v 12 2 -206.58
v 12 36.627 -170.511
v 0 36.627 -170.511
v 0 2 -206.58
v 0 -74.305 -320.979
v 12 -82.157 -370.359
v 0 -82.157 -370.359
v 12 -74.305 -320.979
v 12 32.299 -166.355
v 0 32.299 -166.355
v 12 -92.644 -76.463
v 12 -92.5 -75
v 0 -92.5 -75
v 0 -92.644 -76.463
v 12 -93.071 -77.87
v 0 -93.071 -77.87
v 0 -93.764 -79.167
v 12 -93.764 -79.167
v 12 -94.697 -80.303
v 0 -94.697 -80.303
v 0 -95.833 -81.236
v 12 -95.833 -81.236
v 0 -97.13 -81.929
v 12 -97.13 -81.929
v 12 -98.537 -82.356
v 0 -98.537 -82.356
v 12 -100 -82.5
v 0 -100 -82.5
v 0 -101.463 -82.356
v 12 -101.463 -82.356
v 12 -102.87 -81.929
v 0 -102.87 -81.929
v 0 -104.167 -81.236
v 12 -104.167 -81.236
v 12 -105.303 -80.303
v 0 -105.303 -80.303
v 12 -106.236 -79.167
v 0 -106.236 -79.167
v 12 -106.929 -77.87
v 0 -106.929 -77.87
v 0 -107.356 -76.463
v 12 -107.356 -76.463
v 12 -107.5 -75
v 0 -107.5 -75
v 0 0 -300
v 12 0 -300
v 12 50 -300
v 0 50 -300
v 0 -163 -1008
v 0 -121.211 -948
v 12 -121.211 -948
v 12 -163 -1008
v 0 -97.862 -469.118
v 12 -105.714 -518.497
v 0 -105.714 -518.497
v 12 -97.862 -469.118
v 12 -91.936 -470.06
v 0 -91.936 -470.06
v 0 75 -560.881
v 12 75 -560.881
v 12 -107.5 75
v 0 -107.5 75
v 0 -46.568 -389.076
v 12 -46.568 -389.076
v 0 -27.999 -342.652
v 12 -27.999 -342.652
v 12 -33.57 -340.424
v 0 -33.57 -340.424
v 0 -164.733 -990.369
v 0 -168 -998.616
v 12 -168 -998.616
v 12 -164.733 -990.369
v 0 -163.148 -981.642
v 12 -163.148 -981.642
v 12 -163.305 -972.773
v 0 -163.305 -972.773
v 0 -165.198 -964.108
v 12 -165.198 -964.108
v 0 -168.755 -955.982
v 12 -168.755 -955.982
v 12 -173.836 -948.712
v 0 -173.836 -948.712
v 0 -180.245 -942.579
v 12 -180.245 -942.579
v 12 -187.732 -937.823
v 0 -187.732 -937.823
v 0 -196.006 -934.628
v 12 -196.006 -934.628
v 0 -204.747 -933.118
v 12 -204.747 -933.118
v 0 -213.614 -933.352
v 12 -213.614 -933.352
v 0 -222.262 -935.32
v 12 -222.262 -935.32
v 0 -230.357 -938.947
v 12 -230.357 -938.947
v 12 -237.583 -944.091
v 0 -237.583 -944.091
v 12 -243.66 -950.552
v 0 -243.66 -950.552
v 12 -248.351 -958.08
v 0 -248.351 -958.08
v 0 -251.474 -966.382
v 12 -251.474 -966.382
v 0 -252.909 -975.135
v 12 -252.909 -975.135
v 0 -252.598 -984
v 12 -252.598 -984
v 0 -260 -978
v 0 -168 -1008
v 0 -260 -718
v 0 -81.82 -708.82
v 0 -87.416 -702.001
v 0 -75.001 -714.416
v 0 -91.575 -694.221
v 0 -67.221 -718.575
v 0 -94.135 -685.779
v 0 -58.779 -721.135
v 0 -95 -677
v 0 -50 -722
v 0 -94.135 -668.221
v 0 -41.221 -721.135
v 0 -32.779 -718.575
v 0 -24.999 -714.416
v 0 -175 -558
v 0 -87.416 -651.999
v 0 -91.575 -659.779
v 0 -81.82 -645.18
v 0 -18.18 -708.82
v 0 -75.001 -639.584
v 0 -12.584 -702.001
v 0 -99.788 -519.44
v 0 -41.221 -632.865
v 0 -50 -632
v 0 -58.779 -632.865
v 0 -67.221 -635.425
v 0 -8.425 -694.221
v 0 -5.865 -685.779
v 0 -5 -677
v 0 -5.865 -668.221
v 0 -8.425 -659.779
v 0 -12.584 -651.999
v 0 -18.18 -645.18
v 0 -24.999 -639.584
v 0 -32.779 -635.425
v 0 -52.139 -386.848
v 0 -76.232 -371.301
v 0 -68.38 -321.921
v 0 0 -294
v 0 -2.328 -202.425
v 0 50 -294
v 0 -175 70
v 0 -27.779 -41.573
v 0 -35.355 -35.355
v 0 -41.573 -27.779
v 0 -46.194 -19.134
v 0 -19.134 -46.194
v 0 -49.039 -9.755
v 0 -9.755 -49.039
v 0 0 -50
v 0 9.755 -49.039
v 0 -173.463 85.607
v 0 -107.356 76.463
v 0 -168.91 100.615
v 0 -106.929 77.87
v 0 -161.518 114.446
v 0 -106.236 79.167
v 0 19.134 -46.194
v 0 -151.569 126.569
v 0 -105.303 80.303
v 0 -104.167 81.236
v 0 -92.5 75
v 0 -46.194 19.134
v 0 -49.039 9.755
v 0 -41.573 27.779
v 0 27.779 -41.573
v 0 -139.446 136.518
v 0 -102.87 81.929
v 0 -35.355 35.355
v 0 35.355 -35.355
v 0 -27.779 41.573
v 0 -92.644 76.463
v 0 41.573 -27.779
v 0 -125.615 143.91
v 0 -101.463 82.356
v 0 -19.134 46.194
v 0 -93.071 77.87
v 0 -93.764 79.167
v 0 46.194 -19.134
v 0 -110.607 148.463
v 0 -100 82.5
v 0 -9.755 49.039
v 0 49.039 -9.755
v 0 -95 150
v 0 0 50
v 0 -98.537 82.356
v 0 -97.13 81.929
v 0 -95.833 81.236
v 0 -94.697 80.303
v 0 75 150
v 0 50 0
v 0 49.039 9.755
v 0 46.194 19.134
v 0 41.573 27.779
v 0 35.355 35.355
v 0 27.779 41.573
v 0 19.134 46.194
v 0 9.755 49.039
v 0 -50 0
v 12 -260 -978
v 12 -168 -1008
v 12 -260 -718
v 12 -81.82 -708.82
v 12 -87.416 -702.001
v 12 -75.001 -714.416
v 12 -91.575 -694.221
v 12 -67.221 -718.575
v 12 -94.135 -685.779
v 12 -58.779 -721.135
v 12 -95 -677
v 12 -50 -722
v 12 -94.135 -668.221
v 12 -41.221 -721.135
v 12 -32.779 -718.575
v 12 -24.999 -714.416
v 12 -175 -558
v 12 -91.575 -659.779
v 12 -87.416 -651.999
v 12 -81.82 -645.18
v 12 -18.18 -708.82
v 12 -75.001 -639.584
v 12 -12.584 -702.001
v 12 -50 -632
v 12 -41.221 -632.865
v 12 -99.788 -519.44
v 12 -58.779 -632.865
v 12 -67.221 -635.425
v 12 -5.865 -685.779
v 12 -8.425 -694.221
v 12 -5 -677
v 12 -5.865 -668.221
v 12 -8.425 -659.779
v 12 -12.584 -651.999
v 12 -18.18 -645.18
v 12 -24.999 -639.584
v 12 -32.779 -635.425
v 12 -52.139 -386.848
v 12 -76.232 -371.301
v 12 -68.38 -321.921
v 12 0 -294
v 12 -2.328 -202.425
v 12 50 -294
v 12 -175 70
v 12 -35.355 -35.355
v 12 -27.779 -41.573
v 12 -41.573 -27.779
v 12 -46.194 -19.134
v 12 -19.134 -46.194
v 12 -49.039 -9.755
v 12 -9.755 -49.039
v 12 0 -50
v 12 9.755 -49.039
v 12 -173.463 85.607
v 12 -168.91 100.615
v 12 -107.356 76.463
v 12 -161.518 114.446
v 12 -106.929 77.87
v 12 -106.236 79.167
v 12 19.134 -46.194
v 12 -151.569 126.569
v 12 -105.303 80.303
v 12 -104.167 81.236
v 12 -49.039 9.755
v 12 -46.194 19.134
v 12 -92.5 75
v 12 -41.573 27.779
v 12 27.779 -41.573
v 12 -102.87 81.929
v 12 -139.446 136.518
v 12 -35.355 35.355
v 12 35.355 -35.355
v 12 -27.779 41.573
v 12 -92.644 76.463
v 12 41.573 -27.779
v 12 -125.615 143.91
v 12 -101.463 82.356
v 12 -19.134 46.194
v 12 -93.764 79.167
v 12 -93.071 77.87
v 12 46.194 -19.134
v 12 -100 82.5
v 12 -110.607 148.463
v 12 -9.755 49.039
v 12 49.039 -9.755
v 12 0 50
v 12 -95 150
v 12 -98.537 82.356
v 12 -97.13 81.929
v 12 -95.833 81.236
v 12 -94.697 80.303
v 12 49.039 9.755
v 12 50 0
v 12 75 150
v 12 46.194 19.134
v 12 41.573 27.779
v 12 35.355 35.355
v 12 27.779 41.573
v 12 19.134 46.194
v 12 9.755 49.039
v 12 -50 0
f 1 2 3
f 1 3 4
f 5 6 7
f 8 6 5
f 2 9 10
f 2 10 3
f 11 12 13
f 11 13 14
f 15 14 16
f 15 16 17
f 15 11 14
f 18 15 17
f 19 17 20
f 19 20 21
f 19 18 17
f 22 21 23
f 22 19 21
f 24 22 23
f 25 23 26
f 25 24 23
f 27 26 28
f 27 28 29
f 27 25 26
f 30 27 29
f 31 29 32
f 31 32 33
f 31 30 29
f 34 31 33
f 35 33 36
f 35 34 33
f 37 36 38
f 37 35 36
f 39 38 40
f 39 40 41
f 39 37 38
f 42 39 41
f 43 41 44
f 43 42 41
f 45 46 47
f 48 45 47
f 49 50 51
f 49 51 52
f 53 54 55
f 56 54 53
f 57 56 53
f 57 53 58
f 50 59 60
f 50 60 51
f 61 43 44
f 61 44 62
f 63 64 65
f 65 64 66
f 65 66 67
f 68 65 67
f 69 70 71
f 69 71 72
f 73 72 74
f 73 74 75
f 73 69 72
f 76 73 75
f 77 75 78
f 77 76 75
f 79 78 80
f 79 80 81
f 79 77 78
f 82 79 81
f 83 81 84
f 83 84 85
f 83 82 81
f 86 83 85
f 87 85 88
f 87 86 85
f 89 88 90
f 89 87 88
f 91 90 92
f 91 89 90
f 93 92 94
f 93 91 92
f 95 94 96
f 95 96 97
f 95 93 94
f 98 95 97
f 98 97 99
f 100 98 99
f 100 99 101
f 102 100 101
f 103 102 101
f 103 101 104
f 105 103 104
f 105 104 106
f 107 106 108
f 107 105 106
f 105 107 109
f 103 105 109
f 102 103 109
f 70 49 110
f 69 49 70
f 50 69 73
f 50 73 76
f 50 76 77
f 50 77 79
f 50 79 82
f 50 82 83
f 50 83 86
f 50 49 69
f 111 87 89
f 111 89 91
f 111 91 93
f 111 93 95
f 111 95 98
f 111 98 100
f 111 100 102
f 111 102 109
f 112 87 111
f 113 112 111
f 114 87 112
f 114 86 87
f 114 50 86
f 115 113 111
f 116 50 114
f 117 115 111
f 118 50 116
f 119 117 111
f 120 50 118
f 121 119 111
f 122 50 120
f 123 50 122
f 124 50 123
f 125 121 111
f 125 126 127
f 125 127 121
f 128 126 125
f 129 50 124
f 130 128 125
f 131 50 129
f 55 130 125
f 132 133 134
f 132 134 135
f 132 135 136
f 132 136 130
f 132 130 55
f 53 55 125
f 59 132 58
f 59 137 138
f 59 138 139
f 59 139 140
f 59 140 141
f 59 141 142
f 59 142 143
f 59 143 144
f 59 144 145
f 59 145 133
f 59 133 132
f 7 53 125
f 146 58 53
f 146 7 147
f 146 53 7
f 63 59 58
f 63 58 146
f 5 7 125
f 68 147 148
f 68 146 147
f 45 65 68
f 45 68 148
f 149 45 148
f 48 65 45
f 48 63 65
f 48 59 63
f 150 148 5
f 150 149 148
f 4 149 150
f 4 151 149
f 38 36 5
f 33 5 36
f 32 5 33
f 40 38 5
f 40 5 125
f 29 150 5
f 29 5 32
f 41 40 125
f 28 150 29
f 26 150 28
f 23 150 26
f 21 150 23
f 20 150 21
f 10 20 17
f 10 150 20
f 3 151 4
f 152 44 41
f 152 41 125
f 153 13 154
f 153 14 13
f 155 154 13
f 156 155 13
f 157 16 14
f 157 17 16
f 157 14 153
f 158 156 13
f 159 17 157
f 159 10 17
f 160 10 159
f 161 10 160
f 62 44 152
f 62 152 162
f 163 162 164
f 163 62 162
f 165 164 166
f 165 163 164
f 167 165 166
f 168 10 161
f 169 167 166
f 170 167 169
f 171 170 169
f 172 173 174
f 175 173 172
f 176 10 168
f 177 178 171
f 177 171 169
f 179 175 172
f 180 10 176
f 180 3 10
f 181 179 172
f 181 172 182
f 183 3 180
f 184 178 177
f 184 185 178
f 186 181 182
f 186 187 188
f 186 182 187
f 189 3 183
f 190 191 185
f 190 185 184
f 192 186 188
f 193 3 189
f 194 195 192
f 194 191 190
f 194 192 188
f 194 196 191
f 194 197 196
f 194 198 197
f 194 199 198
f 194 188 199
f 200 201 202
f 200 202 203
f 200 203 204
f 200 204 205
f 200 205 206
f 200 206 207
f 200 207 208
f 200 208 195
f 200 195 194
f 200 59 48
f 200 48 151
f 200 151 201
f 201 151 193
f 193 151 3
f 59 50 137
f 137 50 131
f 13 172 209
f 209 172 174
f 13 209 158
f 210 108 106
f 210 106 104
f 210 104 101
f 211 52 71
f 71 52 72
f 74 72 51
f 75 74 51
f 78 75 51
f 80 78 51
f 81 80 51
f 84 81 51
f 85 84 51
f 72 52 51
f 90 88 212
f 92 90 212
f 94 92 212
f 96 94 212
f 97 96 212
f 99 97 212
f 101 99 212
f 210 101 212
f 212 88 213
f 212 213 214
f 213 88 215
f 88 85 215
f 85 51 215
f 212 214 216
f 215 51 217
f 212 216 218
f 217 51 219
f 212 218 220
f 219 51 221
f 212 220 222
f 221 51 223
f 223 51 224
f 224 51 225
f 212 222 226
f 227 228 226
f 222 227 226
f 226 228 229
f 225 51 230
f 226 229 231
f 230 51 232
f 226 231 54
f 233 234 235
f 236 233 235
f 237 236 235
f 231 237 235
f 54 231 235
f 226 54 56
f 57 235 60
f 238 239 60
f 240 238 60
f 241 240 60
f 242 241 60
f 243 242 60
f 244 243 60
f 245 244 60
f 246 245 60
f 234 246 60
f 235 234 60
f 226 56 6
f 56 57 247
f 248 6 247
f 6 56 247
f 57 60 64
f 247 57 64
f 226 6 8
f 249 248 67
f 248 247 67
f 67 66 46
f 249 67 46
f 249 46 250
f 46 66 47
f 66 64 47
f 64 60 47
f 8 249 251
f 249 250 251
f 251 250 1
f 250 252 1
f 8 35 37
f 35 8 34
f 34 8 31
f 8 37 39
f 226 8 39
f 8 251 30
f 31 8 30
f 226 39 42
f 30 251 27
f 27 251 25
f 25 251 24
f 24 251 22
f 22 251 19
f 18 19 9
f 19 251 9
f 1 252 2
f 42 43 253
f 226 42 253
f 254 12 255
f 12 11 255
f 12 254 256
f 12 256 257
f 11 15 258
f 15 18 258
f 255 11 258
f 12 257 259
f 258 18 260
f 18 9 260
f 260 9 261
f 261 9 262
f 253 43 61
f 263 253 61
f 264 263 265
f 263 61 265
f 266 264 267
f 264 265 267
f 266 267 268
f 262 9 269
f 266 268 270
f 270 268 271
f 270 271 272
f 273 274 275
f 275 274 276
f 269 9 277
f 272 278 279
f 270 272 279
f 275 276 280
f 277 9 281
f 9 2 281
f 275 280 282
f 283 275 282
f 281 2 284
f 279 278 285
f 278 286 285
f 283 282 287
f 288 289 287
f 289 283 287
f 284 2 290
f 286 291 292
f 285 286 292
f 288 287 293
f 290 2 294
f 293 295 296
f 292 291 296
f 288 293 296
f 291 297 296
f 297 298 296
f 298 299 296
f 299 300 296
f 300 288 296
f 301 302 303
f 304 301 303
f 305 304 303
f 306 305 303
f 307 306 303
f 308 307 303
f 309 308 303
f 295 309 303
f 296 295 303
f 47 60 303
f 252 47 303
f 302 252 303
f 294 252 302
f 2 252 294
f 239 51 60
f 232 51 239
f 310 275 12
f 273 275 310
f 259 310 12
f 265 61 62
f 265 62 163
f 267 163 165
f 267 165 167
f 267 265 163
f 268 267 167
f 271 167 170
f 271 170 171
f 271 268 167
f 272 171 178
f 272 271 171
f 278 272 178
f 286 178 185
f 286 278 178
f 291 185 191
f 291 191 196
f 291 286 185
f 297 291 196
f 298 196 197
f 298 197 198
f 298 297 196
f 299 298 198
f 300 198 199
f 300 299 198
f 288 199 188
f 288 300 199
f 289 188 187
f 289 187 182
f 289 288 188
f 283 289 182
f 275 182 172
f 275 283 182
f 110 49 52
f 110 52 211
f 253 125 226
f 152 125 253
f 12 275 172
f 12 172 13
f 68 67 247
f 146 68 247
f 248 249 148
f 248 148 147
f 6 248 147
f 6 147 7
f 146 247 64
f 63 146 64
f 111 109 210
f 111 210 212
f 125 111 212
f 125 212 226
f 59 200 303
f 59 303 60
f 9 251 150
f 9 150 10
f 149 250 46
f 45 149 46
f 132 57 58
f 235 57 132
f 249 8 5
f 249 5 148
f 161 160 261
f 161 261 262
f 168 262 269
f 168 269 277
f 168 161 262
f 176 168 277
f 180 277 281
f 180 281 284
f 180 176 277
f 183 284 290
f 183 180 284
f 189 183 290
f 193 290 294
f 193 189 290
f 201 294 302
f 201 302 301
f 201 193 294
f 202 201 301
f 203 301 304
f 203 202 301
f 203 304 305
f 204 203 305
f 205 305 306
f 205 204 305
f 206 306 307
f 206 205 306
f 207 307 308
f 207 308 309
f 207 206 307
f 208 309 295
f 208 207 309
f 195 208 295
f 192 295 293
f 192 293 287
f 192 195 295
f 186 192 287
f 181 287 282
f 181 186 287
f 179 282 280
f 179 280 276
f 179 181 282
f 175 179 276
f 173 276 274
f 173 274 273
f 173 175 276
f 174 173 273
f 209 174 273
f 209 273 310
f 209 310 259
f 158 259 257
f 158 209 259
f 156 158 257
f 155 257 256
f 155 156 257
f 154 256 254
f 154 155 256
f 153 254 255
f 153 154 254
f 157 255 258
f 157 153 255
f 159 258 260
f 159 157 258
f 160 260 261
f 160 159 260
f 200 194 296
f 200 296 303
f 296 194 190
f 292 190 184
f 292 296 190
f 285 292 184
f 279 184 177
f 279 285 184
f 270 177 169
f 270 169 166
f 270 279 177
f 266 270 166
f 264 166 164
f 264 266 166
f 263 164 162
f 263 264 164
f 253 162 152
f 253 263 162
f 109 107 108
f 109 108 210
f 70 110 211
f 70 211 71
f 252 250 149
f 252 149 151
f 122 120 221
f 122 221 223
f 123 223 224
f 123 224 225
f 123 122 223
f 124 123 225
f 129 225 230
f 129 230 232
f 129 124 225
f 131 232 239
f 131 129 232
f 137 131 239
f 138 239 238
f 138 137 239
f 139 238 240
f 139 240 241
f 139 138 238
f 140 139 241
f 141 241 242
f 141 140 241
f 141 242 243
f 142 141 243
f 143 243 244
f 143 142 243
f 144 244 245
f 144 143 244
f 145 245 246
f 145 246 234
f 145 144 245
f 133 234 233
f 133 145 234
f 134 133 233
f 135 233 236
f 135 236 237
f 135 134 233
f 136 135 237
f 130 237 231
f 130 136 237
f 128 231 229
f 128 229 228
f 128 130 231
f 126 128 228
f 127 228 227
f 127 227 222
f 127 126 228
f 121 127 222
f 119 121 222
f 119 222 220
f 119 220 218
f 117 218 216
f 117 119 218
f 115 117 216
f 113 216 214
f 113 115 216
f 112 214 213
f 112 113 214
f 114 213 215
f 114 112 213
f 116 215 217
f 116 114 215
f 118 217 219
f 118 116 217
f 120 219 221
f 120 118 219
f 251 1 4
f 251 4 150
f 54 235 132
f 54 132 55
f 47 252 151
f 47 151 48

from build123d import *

# Parameters (mm, degrees)
SKETCH_1_R          = 50
SKETCH_1_R_2        = 45
EXTRUDE_1_DEPTH     = 12
FILLET_1_R          = 80
CUT_EXTRUDE_1_DEPTH = 12
SKETCH_4_W          = 6
SKETCH_4_H          = 50
CUT_EXTRUDE_2_DEPTH = 12


with BuildPart() as part:
    # 草图1 → 凸台-拉伸1 (new body)
    with BuildSketch(Plane(origin=(0, 0, 0), x_dir=(0, 0, -1), z_dir=(1, 0, 0))):
        with BuildLine():
            Line((-150, 75), (560.88072706, 75))
            Line((560.88072706, 75), (948, -121.211138337))
            Line((948, -121.211138337), (1008, -163))
            Line((1008, -163), (1008, -168))
            Line((1008, -168), (998.615528128, -168))
            ThreePointArc((998.615528128, -168), (933.656897839, -200.339106398), (984, -252.598206242))
            Line((984, -252.598206242), (978, -260))
            Line((978, -260), (718, -260))
            Line((718, -260), (558, -175))
            Line((558, -175), (-150, -175))
            Line((-150, -175), (-150, 75))
        make_face()
        Circle(SKETCH_1_R, mode=Mode.SUBTRACT)
        with Locations((677, -50)):
            Circle(SKETCH_1_R_2, mode=Mode.SUBTRACT)
    extrude(amount=EXTRUDE_1_DEPTH)

    # 圆角1
    fillet_1_edges = [part.edges().sort_by_distance(p)[0] for p in [
        (6, -175, 150),
    ]]
    fillet(fillet_1_edges, radius=FILLET_1_R)

    # 草图3 → 切除-拉伸1 (cut)
    with BuildSketch(Plane(origin=(12, 0, 0), x_dir=(0, 0, -1), z_dir=(1, 0, 0))):
        with BuildLine():
            Line((-75, -92.5), (75, -92.5))
            ThreePointArc((75, -92.5), (82.5, -100), (75, -107.5))
            Line((75, -107.5), (-75, -107.5))
            ThreePointArc((-75, -107.5), (-82.5, -100), (-75, -92.5))
        make_face()
    extrude(amount=-CUT_EXTRUDE_1_DEPTH, mode=Mode.SUBTRACT)

    # 草图4 → 切除-拉伸2 (cut)
    with BuildSketch(Plane(origin=(12, 0, 0), x_dir=(0, 0, -1), z_dir=(1, 0, 0))):
        Polygon((170.51068381, 36.627050799), (206.580049862, 2.000459389), (202.424858893, -2.327864537), (166.355492841, 32.298726872), align=None)
        with Locations((297, 25)):
            Rectangle(SKETCH_4_W, SKETCH_4_H)
        Polygon((340.423834544, -33.569533818), (386.847669089, -52.139067635), (389.076013147, -46.56820749), (342.652178602, -27.998673672), align=None)
        Polygon((470.060094707, -91.936220159), (519.439680826, -99.788383854), (518.497421183, -105.713934188), (469.117835064, -97.861770494), align=None)
        Polygon((321.921336349, -68.379729076), (371.300922468, -76.231892771), (370.358662825, -82.157443105), (320.979076706, -74.305279411), align=None)
    extrude(amount=-CUT_EXTRUDE_2_DEPTH, mode=Mode.SUBTRACT)


solid = part.part
